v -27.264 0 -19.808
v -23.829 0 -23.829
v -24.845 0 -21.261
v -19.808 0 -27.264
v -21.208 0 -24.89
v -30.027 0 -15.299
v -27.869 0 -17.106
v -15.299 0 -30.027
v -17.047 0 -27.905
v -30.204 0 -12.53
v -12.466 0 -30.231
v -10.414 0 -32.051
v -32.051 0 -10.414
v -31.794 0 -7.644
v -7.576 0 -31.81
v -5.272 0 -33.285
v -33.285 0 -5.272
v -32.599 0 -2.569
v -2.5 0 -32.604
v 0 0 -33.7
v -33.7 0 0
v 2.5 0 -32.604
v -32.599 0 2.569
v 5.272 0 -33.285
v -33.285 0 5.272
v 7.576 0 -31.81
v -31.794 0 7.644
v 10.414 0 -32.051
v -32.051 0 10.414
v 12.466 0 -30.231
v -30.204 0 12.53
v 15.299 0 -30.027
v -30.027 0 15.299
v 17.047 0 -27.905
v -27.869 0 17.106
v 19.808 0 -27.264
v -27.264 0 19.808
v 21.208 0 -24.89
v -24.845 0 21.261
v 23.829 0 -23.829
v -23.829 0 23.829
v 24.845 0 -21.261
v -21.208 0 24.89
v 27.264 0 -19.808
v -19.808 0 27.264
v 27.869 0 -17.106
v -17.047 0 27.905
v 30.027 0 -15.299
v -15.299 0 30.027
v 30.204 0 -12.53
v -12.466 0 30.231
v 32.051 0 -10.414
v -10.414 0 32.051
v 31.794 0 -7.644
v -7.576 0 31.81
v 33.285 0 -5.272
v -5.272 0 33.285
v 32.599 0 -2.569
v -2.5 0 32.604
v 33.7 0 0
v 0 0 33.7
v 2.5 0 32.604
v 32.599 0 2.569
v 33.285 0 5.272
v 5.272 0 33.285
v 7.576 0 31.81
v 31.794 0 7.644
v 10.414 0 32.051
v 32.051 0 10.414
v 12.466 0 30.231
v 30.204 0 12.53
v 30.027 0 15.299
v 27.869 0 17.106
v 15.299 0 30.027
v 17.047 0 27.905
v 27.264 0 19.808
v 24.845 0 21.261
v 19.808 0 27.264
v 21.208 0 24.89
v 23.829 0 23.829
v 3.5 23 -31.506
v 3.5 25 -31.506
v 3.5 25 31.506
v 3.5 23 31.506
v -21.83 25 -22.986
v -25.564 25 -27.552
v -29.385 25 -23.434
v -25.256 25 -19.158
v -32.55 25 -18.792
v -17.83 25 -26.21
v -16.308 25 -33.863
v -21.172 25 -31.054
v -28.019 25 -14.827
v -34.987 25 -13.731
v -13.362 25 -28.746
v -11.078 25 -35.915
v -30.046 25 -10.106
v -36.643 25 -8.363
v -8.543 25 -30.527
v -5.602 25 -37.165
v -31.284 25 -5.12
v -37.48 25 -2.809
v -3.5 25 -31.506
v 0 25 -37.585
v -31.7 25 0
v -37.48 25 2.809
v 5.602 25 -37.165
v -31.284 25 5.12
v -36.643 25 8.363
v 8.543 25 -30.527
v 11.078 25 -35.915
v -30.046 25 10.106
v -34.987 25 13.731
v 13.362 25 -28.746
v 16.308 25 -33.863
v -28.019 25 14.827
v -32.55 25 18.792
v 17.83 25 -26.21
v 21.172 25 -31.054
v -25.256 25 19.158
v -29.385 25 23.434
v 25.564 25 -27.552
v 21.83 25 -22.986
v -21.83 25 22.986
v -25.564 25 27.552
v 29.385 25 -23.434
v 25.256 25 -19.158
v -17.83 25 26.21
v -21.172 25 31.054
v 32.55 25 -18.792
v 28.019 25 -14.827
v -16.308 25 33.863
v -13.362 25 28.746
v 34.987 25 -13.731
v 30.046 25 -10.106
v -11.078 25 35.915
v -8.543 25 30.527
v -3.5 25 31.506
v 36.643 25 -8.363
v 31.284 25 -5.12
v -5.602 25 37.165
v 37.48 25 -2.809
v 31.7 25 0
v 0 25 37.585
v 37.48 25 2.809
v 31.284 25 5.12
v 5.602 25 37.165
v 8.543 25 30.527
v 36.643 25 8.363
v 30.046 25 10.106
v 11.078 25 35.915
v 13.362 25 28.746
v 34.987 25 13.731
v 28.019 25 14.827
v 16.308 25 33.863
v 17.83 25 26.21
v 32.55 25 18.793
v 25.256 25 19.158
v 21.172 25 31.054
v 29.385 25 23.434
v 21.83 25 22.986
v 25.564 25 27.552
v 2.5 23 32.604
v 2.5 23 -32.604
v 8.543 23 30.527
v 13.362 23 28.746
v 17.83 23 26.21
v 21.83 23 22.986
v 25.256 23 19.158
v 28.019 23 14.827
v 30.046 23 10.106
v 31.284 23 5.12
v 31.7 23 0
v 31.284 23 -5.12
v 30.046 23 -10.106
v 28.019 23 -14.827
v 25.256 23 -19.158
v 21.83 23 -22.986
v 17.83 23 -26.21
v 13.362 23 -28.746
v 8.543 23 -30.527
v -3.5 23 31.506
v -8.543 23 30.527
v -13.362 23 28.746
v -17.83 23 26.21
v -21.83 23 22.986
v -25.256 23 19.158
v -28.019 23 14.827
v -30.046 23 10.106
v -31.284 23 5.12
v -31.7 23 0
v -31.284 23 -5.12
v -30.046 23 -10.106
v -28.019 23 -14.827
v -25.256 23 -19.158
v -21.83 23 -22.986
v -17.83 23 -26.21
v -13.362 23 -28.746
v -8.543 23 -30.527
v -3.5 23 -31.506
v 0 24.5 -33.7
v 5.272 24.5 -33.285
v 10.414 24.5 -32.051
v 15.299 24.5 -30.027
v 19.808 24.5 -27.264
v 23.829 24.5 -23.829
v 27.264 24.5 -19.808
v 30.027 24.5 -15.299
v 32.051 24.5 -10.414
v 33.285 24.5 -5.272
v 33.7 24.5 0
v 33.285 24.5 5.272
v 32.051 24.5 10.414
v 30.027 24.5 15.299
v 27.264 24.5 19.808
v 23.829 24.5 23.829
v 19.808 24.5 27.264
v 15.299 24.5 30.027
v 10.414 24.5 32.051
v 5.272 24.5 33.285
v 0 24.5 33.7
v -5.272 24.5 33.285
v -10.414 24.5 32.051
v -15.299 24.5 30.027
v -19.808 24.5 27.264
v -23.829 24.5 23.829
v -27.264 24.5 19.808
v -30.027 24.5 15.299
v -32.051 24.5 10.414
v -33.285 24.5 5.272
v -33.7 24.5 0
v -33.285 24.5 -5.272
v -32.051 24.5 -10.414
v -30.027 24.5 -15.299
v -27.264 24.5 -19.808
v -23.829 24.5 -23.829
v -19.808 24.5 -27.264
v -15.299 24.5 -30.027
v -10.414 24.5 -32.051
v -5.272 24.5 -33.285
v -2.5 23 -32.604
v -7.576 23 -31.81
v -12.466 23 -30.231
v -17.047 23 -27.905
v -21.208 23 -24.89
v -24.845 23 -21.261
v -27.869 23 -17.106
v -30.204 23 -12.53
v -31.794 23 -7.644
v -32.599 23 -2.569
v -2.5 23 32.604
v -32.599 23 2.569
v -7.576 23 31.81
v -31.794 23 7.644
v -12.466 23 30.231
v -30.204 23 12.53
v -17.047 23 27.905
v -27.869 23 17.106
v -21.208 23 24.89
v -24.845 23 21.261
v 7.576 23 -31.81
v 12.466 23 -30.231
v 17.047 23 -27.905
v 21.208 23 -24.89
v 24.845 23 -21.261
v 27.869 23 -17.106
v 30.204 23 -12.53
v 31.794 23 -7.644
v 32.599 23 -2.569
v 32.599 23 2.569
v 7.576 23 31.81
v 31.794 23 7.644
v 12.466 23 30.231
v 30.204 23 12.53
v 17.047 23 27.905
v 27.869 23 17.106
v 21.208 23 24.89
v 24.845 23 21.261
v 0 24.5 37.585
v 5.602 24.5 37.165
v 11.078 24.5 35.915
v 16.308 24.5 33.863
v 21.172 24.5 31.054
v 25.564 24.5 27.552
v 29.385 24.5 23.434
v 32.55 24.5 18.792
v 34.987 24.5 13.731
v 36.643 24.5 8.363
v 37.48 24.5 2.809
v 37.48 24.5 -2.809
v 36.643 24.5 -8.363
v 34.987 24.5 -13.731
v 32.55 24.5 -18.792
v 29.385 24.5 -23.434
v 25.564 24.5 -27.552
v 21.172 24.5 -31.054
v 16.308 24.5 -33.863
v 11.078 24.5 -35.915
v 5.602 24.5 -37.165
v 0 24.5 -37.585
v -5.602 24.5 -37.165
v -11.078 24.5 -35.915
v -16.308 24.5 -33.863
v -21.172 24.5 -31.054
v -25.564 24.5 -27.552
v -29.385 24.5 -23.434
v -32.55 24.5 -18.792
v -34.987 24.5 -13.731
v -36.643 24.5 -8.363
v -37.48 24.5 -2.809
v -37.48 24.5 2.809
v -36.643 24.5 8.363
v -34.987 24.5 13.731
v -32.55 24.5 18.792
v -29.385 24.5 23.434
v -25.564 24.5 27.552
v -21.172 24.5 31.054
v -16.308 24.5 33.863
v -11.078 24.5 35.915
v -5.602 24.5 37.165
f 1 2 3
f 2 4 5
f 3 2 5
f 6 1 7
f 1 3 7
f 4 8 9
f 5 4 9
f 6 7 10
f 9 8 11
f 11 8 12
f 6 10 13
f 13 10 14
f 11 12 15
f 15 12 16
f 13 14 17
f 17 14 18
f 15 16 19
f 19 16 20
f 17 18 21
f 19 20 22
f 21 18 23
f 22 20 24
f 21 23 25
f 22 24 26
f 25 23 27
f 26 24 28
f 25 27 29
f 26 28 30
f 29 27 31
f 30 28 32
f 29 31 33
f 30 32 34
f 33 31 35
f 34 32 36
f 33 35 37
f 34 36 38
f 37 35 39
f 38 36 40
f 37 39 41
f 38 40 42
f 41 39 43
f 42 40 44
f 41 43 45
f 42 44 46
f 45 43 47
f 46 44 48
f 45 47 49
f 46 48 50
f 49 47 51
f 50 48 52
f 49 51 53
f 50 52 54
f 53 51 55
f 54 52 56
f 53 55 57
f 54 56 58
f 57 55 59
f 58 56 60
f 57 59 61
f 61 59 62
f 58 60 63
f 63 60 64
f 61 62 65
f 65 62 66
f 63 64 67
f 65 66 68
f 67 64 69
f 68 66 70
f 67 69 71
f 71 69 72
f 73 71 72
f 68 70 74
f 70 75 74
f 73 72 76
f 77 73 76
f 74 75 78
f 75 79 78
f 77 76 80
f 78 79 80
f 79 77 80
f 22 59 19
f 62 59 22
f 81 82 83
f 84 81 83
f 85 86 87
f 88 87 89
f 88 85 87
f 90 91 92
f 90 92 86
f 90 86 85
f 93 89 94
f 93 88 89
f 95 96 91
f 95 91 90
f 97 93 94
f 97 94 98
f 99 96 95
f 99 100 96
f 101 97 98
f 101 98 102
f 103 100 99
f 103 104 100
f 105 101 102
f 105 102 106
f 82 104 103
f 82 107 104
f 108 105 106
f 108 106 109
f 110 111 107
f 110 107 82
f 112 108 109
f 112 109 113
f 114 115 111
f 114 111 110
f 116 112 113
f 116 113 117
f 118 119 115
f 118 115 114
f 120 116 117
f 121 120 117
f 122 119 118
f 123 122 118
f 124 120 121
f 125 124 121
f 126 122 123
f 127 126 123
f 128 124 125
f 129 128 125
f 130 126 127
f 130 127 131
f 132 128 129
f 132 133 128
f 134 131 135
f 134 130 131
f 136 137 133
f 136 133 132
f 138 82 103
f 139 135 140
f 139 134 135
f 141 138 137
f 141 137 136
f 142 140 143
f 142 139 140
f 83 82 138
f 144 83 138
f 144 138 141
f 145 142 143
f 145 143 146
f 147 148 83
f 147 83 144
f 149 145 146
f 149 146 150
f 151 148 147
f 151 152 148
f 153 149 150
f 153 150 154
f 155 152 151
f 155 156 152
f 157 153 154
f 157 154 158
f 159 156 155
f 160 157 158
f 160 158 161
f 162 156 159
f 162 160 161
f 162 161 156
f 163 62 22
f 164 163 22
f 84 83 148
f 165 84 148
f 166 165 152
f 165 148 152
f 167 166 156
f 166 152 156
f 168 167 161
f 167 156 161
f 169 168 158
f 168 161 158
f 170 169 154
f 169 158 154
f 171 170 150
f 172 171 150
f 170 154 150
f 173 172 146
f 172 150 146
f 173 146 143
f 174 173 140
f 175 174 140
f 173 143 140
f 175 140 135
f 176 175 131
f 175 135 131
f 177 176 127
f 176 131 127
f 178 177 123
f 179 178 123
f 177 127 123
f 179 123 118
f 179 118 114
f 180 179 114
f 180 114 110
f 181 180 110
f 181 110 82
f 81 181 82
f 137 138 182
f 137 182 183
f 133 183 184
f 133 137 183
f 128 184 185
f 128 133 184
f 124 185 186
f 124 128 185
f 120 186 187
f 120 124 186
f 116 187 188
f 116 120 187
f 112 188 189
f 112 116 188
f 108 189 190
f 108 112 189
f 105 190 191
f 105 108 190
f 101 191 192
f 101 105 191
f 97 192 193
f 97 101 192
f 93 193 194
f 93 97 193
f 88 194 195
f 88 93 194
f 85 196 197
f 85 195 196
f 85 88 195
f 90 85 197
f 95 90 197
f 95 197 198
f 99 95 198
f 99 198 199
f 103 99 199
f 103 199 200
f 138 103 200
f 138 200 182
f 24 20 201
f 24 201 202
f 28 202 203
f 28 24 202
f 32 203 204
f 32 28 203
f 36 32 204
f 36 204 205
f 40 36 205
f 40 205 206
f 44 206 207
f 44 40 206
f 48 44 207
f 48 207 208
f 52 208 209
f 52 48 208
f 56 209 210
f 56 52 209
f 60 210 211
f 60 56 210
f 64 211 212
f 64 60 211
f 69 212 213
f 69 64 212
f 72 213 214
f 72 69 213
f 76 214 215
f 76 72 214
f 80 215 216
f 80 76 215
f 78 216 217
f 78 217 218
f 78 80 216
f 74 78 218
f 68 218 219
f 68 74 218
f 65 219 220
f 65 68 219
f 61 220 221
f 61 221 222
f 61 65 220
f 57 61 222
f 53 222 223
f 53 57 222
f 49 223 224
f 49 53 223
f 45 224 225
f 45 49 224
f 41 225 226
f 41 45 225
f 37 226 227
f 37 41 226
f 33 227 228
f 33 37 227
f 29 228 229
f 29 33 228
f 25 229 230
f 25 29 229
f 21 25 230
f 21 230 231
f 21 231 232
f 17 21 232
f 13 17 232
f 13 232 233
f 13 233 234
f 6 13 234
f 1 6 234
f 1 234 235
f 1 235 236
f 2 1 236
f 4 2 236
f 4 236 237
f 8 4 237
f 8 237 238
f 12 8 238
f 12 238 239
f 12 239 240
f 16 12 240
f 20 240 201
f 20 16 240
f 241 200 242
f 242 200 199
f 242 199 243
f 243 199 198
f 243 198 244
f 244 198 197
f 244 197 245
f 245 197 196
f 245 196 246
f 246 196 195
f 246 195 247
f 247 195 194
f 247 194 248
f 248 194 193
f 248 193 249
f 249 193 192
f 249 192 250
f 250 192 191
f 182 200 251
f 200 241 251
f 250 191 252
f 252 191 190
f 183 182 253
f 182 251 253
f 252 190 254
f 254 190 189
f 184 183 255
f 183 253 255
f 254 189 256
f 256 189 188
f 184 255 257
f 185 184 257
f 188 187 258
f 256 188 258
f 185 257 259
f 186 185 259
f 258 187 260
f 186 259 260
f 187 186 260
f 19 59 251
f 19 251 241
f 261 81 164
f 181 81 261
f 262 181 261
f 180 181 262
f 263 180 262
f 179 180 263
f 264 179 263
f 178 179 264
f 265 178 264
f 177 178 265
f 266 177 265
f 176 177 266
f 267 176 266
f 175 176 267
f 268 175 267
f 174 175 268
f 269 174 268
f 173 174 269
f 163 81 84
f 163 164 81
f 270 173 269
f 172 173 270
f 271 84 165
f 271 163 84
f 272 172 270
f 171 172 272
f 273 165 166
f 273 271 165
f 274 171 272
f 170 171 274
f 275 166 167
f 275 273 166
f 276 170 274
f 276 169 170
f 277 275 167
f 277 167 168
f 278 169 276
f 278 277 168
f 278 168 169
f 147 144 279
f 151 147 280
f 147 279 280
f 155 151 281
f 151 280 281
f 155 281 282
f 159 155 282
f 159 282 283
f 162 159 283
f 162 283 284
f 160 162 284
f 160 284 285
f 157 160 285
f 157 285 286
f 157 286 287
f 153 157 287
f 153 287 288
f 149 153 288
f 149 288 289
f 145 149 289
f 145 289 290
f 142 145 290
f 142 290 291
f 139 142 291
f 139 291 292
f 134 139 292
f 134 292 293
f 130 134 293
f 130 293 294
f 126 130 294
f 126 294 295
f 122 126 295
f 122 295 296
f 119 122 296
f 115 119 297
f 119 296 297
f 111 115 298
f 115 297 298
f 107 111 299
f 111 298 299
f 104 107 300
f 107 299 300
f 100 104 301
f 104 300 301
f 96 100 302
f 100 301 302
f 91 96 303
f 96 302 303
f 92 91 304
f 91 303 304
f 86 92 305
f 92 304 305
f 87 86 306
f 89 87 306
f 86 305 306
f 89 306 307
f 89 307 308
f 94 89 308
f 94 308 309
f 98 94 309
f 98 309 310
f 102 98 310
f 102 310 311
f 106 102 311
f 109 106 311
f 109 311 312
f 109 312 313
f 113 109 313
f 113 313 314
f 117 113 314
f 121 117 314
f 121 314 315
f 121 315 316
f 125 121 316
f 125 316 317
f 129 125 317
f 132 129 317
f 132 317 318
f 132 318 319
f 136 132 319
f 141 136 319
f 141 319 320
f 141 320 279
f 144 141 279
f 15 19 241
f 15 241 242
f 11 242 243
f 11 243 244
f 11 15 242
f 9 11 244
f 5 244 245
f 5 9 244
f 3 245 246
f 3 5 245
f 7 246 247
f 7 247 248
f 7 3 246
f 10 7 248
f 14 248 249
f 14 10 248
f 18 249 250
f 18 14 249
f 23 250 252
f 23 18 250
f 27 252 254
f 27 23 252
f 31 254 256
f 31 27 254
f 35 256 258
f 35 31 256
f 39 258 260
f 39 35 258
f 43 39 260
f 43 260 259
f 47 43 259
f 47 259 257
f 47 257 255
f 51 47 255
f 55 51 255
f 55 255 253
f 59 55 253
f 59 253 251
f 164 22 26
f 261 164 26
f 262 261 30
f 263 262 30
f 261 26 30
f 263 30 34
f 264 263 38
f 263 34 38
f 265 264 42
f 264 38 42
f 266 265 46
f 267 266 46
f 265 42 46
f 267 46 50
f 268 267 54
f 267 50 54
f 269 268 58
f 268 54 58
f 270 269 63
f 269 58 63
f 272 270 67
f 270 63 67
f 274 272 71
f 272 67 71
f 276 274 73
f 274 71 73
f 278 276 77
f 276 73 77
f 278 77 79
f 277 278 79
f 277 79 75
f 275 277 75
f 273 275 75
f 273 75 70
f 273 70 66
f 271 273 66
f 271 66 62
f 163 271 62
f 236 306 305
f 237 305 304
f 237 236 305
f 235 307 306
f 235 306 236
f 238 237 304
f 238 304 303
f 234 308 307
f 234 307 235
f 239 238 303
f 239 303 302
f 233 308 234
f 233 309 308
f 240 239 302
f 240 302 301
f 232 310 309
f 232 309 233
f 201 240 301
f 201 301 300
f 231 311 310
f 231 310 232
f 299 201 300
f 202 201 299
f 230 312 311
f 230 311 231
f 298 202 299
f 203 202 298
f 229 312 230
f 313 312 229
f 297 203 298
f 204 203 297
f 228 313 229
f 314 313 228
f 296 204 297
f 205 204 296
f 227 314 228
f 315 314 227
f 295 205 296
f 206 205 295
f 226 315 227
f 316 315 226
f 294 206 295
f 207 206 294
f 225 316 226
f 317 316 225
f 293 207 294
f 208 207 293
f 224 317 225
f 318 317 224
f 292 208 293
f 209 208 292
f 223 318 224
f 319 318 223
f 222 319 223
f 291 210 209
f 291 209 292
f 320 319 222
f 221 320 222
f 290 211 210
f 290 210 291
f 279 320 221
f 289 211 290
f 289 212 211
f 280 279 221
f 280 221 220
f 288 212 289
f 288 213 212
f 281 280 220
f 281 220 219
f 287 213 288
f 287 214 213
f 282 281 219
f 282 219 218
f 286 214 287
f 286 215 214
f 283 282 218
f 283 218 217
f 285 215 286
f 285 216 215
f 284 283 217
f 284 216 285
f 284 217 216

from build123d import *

# Parameters (mm, degrees)
OUTER_BASE_CIRCLE_SKETCH_R         = 37.585
BODY_EXTRUDE_DEPTH                 = 25
INNER_BASE_CIRCLE_SKETCH_OUTSIDE_W = 99.012
INNER_BASE_CIRCLE_SKETCH_OUTSIDE_H = 99.012
INNER_BASE_CIRCLE_SKETCH_OUTSIDE_R = 33.7
OUTER_BODY_EXTRUDE_DEPTH           = 24.5
DELIVERY_HOLE_EXTRUDE_DEPTH        = 59.738951727
FASTENER_EXTRUDE_DEPTH             = 23


with BuildPart() as part:
    # Outer Base Circle Sketch → Body Extrude (new body)
    with BuildSketch(Plane(origin=(0, 0, 0), x_dir=(1, 0, 0), z_dir=(0, 1, 0))):
        with Locations(Location((0, 0, 0), (0, 0, 270))):
            Circle(OUTER_BASE_CIRCLE_SKETCH_R)
    extrude(amount=BODY_EXTRUDE_DEPTH)

    # Inner Base Circle Sketch outside → Outer Body Extrude (cut)
    with BuildSketch(Plane.XZ):
        Rectangle(INNER_BASE_CIRCLE_SKETCH_OUTSIDE_W, INNER_BASE_CIRCLE_SKETCH_OUTSIDE_H)
        with Locations(Location((0, 0, 0), (0, 0, 270))):
            Circle(INNER_BASE_CIRCLE_SKETCH_OUTSIDE_R, mode=Mode.SUBTRACT)
    extrude(amount=-OUTER_BODY_EXTRUDE_DEPTH, mode=Mode.SUBTRACT)

    # Delivery Hole Sketch → Delivery Hole Extrude (cut, through all)
    with BuildSketch(Plane(origin=(0, 25, 0), x_dir=(1, 0, 0), z_dir=(0, 1, 0))):
        with BuildLine():
            Line((-3.5, 31.506189868), (-3.5, -31.506189868))
            ThreePointArc((-3.5, -31.506189868), (-31.7, 0), (-3.5, 31.506189868))
        make_face()
        with BuildLine():
            Line((3.5, 31.506189868), (3.5, -31.506189868))
            ThreePointArc((3.5, -31.506189868), (31.7, 0), (3.5, 31.506189868))
        make_face()
    extrude(amount=-DELIVERY_HOLE_EXTRUDE_DEPTH, mode=Mode.SUBTRACT)

    # Fastener Sketch → Fastener Extrude (cut)
    with BuildSketch(Plane.XZ):
        with BuildLine():
            Line((-2.5, 32.604294196), (-2.5, -32.604294196))
            ThreePointArc((-2.5, -32.604294196), (-32.7, 0), (-2.5, 32.604294196))
        make_face()
        with BuildLine():
            Line((2.5, 32.604294196), (2.5, -32.604294196))
            ThreePointArc((2.5, -32.604294196), (32.7, 0), (2.5, 32.604294196))
        make_face()
    extrude(amount=-FASTENER_EXTRUDE_DEPTH, mode=Mode.SUBTRACT)


solid = part.part
